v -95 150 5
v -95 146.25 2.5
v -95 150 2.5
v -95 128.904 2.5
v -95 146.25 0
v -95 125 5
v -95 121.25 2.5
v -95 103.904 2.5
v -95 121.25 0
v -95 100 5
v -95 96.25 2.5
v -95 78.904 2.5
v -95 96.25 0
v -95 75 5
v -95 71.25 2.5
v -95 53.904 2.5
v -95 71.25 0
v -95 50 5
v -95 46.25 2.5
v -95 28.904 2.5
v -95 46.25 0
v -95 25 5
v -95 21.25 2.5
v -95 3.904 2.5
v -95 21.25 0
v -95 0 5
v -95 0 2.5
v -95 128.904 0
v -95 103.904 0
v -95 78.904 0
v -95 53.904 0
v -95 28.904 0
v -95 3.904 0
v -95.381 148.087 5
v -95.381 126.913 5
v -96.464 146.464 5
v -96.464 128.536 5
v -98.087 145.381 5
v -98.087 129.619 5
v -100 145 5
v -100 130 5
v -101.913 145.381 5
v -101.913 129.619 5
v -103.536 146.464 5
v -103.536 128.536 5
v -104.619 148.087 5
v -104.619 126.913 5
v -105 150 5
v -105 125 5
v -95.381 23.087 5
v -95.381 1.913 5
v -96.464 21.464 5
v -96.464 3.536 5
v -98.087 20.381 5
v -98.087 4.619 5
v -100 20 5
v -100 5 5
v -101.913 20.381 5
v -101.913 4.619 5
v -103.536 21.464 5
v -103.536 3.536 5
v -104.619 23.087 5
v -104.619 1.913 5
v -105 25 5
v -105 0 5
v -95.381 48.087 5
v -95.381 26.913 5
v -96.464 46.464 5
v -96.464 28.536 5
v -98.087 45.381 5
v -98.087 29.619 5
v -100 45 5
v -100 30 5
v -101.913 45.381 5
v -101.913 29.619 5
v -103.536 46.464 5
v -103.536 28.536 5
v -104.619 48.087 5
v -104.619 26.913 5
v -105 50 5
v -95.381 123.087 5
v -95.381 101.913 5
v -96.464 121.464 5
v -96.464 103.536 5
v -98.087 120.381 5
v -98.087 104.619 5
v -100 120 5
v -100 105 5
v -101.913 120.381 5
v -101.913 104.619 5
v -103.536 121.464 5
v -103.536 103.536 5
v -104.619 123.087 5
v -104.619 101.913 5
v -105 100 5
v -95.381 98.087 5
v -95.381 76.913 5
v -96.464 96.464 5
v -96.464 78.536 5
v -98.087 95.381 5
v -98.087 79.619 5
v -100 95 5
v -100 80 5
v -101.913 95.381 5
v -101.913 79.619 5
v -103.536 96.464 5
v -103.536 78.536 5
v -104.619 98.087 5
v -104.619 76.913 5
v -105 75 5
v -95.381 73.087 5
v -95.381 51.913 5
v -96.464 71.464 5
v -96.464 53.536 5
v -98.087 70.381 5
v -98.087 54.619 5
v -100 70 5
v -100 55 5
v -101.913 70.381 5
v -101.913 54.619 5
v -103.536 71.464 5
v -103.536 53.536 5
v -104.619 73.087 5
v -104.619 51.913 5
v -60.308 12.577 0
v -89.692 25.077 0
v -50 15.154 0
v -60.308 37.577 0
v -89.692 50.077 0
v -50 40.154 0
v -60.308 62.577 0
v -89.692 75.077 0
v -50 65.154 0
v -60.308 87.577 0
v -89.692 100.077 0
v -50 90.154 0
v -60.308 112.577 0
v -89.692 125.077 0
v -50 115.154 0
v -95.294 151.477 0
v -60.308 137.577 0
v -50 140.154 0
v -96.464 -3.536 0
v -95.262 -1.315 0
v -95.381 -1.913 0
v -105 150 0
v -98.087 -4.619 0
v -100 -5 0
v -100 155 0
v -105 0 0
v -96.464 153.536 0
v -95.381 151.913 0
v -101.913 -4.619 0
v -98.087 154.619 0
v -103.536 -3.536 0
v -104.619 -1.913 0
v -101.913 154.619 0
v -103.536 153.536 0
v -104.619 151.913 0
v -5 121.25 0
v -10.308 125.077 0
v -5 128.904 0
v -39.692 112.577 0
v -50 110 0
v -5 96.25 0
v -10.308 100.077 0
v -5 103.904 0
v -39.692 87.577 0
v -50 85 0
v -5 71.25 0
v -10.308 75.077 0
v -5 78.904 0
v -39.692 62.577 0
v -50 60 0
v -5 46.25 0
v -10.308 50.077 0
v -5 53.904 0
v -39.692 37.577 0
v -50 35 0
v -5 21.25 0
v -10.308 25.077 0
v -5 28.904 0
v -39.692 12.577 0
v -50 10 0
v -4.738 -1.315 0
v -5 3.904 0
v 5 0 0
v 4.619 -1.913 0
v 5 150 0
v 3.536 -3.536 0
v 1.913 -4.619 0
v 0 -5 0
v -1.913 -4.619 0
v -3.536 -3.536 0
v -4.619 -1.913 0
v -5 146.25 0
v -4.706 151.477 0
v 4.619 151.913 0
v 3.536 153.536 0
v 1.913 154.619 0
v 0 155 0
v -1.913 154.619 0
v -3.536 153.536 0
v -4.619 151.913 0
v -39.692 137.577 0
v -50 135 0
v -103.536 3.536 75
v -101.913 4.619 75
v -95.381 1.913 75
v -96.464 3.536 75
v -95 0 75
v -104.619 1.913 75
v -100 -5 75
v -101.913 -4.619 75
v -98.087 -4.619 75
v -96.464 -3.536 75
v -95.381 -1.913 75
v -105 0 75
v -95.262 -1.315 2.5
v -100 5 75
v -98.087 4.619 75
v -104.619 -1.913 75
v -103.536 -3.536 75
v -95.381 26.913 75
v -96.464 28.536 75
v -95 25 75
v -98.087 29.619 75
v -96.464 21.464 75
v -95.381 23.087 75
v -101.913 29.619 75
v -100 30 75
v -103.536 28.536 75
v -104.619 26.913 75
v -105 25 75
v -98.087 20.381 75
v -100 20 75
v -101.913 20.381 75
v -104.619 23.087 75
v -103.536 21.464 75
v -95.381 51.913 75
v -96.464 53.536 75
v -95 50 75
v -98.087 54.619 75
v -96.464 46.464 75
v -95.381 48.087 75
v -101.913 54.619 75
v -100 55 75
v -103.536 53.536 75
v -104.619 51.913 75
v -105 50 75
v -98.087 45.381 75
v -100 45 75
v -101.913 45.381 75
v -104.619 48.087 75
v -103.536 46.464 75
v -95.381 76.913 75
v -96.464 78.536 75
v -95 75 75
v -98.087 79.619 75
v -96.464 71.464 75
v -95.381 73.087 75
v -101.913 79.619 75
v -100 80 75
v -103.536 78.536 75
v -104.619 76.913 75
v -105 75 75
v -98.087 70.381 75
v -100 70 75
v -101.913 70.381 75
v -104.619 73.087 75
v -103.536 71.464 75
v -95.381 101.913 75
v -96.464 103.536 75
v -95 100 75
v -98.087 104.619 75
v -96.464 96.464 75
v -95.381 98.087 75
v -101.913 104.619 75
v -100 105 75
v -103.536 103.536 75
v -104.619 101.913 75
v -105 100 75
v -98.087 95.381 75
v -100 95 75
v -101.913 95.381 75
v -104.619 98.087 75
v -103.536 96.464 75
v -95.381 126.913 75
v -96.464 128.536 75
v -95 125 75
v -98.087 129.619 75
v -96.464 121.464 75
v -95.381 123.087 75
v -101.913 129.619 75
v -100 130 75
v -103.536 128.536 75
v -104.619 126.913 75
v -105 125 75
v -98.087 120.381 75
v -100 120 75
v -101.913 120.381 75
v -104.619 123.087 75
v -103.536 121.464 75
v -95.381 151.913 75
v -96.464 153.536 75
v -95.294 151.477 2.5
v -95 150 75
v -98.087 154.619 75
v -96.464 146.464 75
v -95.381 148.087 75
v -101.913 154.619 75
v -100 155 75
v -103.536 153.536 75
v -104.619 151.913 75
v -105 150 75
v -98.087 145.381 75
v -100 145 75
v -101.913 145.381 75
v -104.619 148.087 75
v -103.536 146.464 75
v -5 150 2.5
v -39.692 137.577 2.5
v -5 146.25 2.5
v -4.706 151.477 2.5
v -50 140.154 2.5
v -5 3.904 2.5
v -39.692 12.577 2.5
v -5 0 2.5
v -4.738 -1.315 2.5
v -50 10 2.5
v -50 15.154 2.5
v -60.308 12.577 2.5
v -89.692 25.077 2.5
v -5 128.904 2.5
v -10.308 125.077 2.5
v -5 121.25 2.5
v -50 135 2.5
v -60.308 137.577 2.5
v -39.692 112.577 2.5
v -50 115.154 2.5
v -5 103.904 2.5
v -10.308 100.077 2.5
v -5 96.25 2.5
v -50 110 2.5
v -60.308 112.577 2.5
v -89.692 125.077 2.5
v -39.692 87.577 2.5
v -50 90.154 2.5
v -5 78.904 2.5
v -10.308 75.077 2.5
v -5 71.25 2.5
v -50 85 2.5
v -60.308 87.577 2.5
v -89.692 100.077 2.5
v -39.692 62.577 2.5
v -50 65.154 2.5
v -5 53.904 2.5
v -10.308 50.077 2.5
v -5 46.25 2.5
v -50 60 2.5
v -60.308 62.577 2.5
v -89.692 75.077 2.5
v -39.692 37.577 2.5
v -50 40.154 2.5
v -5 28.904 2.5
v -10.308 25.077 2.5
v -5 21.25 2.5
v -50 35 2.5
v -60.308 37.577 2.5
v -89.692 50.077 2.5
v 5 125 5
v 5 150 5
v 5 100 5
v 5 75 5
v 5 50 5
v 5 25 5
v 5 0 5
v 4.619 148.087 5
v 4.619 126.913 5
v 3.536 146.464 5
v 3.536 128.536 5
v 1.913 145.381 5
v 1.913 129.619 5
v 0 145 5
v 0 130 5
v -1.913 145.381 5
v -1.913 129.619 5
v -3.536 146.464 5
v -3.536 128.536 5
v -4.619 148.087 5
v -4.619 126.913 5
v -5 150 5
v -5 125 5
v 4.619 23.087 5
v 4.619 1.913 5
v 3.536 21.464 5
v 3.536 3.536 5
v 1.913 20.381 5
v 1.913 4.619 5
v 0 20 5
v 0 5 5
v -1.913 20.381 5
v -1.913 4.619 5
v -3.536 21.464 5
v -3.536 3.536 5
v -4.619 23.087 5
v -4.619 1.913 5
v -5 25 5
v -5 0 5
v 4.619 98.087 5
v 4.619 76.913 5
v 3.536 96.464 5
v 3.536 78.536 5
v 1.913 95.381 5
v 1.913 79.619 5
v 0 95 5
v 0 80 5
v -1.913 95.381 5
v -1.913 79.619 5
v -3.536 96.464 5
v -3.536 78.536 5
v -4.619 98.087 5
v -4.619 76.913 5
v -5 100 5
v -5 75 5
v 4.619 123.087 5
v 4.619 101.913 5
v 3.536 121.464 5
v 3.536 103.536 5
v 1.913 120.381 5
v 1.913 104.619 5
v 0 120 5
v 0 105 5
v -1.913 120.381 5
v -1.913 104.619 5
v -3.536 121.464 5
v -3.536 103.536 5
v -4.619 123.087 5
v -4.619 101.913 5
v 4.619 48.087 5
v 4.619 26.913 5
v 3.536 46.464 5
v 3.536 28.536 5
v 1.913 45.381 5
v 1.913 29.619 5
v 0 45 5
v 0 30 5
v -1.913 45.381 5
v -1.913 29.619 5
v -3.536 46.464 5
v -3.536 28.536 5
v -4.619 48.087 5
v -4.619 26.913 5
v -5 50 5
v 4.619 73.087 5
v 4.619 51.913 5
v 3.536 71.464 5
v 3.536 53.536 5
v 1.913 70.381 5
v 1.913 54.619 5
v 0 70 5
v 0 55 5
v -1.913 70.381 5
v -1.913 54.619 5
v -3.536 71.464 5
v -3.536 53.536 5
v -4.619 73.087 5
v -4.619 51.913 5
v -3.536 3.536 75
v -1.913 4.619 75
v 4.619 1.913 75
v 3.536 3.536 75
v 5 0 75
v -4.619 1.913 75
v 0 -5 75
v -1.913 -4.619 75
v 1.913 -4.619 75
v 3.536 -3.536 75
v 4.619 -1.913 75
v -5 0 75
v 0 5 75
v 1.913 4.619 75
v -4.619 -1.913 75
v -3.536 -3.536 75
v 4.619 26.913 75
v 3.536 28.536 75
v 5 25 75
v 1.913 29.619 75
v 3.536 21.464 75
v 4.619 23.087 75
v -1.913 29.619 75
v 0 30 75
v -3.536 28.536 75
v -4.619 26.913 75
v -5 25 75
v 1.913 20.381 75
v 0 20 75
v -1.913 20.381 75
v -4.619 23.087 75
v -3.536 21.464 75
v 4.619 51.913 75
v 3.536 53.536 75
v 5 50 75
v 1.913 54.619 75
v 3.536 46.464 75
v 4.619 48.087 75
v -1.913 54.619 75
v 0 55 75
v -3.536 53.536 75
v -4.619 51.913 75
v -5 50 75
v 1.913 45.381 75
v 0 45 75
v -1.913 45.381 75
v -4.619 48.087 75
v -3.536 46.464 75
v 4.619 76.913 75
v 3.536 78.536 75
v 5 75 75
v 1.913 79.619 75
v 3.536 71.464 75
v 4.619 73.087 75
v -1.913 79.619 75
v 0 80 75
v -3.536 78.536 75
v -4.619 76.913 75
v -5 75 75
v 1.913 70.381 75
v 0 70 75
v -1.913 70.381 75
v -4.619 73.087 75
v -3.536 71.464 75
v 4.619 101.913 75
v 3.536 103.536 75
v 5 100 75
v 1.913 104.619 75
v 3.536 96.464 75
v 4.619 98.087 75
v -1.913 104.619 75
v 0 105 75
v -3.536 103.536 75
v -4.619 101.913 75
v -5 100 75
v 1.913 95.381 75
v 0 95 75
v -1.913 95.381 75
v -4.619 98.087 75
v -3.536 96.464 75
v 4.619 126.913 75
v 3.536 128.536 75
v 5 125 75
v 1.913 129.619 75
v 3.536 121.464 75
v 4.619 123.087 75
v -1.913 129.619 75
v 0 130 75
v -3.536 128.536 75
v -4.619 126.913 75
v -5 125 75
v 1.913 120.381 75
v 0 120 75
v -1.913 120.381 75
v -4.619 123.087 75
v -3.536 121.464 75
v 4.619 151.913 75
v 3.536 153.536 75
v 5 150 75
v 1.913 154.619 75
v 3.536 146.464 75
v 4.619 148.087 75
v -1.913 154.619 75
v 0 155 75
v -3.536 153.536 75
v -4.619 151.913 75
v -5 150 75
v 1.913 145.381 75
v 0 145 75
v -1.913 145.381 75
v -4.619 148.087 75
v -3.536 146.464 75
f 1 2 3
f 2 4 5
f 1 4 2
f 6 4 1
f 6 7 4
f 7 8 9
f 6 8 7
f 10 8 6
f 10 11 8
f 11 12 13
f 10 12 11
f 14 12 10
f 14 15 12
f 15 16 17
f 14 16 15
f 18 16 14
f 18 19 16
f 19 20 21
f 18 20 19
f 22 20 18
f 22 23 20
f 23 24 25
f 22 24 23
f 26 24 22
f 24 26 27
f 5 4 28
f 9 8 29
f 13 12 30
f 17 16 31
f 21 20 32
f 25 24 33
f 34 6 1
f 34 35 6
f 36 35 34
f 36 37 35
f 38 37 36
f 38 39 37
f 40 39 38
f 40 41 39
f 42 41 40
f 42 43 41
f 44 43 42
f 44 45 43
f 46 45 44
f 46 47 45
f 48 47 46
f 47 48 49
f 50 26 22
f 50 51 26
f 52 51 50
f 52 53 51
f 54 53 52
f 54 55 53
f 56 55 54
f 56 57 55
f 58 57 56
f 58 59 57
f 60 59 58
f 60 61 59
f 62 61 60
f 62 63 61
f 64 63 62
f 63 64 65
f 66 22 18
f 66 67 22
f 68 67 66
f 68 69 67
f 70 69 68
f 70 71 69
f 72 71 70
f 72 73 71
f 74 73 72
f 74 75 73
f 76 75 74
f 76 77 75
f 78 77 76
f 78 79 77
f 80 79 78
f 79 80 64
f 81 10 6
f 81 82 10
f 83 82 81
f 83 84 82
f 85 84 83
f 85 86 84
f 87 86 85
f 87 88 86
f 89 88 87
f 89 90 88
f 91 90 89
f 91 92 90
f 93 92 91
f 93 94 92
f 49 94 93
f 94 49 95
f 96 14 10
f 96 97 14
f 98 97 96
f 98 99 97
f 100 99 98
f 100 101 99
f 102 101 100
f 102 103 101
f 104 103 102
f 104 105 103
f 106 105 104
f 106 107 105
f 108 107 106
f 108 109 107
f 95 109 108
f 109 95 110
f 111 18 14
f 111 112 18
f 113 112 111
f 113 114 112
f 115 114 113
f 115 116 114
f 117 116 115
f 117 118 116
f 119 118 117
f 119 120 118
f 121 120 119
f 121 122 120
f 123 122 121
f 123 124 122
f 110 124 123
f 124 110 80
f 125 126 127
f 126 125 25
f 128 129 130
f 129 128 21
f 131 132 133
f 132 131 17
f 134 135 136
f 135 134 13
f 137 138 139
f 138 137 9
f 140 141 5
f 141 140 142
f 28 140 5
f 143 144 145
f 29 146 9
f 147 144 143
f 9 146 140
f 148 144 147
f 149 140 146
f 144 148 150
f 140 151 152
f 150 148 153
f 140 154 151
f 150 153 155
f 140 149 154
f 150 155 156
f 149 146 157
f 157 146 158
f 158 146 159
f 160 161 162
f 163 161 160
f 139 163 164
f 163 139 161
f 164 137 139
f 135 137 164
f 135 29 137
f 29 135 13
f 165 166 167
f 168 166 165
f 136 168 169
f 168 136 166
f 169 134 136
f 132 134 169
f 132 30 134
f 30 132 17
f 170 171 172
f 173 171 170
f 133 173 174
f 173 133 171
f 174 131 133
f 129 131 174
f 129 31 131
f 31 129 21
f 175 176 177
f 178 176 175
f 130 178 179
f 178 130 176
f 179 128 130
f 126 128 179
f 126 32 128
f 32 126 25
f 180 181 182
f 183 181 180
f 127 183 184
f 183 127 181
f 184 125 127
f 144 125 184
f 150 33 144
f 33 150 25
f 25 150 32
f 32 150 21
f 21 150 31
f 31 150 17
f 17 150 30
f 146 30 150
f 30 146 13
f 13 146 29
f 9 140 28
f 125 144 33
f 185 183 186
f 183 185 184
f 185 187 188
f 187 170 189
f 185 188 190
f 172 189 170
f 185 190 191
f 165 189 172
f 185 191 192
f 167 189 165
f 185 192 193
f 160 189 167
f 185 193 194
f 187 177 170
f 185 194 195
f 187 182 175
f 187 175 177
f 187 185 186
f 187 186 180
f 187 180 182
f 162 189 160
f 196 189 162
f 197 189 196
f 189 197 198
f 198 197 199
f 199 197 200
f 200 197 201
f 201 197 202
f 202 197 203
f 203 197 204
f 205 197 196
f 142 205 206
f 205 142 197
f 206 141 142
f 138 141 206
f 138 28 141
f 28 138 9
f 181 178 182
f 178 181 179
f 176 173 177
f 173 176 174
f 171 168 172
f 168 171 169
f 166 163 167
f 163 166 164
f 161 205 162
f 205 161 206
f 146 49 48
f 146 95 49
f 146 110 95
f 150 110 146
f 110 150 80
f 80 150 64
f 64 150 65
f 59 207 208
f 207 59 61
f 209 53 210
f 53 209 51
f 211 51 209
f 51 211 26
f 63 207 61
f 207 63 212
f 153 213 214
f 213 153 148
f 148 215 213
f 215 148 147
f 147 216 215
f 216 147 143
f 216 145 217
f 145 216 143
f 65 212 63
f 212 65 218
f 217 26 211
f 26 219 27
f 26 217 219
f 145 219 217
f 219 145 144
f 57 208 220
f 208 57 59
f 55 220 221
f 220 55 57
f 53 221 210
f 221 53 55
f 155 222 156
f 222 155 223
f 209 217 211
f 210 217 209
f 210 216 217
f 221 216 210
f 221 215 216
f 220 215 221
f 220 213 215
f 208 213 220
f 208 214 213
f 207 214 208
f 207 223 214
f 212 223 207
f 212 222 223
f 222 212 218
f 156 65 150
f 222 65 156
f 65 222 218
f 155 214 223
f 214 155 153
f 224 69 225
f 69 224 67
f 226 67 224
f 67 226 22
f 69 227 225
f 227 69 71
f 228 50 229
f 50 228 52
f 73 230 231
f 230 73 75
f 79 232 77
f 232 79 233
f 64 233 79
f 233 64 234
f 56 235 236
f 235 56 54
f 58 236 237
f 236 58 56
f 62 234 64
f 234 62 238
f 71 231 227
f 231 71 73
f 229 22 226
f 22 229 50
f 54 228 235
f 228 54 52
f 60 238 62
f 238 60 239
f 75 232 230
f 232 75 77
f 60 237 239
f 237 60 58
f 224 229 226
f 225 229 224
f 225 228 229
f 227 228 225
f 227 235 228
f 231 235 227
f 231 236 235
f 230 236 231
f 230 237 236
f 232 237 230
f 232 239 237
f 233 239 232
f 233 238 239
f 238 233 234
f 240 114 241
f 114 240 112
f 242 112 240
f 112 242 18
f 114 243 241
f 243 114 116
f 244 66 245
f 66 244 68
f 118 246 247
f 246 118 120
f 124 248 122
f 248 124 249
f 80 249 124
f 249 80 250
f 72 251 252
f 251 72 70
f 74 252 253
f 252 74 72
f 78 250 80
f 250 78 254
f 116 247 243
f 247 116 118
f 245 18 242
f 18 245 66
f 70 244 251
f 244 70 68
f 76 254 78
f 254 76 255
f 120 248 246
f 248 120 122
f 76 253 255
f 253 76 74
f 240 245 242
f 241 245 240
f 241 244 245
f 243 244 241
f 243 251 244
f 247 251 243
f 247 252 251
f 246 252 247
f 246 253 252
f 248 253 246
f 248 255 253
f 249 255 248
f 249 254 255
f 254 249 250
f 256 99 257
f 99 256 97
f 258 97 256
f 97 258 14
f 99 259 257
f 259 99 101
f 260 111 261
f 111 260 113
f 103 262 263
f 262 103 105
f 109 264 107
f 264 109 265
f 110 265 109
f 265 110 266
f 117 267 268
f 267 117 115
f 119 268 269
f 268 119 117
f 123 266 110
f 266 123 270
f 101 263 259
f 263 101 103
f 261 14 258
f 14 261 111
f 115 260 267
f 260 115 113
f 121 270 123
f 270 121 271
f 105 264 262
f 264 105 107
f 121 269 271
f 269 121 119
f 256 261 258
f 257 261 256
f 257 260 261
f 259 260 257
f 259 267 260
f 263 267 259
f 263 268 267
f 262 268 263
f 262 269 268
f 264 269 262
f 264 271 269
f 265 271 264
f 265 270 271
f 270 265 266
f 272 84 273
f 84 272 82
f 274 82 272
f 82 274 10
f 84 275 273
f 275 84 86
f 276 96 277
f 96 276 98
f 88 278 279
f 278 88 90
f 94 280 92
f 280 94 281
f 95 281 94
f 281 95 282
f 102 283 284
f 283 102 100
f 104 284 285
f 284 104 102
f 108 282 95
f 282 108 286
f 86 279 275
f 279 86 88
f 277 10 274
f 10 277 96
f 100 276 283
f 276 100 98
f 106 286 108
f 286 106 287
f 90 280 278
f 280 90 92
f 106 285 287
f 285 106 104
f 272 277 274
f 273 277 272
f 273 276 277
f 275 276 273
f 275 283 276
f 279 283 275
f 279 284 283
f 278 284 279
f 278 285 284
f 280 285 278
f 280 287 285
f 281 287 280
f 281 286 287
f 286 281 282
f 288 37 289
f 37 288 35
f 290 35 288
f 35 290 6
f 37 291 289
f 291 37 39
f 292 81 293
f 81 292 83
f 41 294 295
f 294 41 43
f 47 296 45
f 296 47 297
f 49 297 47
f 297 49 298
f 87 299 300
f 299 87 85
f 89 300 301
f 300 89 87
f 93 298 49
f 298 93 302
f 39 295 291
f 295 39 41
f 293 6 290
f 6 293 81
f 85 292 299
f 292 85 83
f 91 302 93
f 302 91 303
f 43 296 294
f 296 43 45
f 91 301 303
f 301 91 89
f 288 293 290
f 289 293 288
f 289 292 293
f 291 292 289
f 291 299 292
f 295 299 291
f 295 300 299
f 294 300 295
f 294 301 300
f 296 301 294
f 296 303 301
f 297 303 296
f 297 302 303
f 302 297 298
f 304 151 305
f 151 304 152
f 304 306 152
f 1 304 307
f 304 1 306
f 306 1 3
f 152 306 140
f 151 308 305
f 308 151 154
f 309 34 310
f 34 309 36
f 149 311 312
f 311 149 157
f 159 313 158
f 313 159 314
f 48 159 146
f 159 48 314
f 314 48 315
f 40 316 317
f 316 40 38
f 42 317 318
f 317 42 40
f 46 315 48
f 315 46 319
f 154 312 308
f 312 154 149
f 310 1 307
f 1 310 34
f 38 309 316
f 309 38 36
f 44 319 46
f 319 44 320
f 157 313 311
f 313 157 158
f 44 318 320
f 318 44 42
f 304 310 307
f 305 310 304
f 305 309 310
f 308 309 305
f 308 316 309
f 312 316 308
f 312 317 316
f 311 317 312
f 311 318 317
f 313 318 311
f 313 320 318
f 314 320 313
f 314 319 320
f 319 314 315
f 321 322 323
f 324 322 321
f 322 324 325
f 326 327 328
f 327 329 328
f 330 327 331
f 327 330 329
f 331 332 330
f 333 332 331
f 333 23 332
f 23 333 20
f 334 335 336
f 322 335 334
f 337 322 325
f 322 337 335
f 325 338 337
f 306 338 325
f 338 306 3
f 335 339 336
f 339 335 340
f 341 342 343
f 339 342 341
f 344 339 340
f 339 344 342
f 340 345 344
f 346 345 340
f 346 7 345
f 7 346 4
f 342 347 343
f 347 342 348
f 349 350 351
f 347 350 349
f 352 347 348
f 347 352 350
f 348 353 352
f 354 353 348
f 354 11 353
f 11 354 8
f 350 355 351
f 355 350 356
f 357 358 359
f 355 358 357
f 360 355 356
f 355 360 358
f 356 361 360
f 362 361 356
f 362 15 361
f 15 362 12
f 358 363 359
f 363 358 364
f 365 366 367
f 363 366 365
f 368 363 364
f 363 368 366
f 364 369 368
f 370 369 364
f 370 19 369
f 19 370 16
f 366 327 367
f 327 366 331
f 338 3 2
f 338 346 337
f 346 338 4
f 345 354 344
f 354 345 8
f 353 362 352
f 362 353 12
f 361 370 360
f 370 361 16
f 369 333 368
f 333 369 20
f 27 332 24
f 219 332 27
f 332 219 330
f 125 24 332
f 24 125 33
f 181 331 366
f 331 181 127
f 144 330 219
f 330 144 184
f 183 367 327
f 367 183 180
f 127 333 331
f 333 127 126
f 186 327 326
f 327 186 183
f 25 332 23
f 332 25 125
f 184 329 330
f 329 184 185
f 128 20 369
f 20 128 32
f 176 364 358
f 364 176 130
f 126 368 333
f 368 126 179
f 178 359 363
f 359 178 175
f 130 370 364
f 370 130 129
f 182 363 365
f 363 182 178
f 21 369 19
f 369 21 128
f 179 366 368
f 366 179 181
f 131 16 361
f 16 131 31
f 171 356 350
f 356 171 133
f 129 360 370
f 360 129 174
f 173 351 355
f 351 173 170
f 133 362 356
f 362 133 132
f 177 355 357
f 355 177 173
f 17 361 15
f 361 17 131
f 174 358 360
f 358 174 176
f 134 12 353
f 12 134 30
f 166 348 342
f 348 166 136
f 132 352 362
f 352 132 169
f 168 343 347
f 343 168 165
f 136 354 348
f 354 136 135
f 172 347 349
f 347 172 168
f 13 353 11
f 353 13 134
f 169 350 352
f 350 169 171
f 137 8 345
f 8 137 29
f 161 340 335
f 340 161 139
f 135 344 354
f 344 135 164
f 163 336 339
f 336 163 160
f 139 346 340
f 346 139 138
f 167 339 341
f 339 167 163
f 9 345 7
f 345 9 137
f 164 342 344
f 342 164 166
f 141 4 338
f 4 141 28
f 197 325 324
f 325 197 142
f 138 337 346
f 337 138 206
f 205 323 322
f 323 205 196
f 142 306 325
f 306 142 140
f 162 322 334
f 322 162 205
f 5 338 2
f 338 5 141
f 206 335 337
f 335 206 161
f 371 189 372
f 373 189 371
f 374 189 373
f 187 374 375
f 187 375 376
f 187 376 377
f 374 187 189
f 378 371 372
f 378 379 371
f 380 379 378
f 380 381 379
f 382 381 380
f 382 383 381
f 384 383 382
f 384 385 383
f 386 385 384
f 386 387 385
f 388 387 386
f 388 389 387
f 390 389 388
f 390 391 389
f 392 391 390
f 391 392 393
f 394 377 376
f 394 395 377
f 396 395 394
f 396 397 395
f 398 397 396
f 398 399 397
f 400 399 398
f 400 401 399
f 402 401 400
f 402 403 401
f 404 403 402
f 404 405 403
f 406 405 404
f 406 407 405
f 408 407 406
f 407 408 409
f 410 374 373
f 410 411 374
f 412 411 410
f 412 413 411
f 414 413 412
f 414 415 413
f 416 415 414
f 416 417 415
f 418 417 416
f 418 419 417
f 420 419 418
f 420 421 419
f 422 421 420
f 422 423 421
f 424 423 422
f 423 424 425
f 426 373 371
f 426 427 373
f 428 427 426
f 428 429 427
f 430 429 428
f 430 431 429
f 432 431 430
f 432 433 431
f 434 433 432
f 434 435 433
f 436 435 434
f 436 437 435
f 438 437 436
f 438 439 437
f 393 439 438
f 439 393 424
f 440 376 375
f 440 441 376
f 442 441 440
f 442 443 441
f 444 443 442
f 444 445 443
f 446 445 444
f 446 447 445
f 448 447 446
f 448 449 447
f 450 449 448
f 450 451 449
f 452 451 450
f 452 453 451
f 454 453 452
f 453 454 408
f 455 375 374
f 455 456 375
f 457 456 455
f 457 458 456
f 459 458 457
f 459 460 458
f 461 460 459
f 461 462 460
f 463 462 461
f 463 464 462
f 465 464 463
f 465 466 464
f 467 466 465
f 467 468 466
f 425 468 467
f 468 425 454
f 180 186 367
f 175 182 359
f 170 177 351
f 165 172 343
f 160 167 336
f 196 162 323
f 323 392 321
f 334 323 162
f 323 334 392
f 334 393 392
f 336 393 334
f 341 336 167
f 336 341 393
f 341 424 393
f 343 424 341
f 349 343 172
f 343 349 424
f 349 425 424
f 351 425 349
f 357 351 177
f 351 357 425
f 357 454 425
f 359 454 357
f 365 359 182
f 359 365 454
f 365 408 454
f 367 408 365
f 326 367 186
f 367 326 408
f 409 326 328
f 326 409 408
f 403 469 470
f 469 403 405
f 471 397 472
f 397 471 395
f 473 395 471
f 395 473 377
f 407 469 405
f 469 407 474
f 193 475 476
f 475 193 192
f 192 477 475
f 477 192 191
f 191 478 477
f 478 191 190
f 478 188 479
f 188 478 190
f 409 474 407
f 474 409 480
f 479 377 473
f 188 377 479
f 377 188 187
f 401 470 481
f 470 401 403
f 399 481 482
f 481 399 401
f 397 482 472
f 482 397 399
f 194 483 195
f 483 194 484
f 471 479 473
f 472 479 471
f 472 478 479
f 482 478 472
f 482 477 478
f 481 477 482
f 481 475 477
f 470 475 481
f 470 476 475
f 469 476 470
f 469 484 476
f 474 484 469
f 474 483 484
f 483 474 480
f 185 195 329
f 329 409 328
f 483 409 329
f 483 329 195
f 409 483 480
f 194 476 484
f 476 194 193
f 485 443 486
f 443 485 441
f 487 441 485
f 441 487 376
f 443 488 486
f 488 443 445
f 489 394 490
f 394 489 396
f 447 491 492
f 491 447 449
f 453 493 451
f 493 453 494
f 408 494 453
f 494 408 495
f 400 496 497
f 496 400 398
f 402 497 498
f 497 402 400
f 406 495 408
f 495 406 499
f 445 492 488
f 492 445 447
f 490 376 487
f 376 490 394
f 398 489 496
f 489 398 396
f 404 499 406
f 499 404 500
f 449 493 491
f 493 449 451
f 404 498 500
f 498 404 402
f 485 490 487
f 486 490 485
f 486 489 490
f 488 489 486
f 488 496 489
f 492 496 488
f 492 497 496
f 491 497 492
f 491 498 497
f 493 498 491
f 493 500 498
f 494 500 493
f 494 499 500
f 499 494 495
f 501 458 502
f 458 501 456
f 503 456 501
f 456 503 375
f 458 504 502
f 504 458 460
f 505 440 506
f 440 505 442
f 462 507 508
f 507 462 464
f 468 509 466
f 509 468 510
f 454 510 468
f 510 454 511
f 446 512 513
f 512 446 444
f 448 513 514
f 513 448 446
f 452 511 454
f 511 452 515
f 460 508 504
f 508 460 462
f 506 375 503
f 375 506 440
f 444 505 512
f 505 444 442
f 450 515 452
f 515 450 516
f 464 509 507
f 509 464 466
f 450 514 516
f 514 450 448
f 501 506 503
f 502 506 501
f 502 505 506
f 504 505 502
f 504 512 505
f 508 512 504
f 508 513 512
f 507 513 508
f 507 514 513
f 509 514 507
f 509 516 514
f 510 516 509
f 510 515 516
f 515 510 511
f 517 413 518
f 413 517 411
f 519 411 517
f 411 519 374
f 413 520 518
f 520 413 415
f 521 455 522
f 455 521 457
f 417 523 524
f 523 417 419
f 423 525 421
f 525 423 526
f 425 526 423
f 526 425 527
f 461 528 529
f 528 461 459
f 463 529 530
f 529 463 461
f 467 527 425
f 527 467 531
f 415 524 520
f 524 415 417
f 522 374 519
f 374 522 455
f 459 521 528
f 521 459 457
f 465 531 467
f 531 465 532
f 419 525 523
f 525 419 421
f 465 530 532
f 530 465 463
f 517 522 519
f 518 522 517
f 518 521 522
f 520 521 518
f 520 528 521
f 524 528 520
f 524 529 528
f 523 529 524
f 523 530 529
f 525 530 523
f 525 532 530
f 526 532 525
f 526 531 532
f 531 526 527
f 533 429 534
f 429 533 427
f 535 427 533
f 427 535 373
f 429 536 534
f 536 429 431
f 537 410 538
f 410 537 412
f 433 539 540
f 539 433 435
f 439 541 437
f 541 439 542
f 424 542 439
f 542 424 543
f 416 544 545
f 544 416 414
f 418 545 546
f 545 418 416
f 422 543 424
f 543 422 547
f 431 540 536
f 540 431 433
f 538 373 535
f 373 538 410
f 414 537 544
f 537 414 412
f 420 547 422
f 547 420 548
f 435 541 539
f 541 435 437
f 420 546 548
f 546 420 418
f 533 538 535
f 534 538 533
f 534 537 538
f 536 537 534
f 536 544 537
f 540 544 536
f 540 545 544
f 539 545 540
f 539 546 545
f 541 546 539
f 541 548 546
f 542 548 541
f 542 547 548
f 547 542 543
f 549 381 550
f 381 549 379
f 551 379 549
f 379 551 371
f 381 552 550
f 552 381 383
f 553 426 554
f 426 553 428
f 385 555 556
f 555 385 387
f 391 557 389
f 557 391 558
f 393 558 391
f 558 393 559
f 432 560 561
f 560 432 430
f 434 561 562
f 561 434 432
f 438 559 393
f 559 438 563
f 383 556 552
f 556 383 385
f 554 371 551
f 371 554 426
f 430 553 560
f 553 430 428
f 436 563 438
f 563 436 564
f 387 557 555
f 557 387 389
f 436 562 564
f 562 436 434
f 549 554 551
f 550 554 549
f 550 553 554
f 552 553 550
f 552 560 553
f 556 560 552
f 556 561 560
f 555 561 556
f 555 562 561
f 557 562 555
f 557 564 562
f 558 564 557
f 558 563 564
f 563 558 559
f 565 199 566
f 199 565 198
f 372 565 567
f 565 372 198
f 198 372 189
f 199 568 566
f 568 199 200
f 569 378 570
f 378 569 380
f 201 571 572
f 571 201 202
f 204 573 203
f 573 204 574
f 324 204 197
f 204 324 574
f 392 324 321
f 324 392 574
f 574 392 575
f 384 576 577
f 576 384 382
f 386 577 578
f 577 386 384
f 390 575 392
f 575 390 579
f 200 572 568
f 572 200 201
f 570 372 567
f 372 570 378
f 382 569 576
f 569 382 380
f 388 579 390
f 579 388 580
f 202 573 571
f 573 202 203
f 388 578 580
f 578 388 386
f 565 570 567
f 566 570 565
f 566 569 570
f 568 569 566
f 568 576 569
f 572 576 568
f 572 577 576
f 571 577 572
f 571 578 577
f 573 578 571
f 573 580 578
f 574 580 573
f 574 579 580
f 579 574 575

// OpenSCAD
union() {
	translate(v = [-5, 0, 0]) {
		cube(size = [10, 150, 5]);
	}
	translate(v = [0, 0, 0]) {
		cylinder(h = 75, r = 5);
	}
	translate(v = [0, 25, 0]) {
		cylinder(h = 75, r = 5);
	}
	translate(v = [0, 50, 0]) {
		cylinder(h = 75, r = 5);
	}
	translate(v = [0, 75, 0]) {
		cylinder(h = 75, r = 5);
	}
	translate(v = [0, 100, 0]) {
		cylinder(h = 75, r = 5);
	}
	translate(v = [0, 125, 0]) {
		cylinder(h = 75, r = 5);
	}
	translate(v = [0, 150, 0]) {
		cylinder(h = 75, r = 5);
	}
	translate(v = [-100, 0, 0]) {
		union() {
			translate(v = [-5, 0, 0]) {
				cube(size = [10, 150, 5]);
			}
			translate(v = [0, 0, 0]) {
				cylinder(h = 75, r = 5);
			}
			translate(v = [0, 25, 0]) {
				cylinder(h = 75, r = 5);
			}
			translate(v = [0, 50, 0]) {
				cylinder(h = 75, r = 5);
			}
			translate(v = [0, 75, 0]) {
				cylinder(h = 75, r = 5);
			}
			translate(v = [0, 100, 0]) {
				cylinder(h = 75, r = 5);
			}
			translate(v = [0, 125, 0]) {
				cylinder(h = 75, r = 5);
			}
			translate(v = [0, 150, 0]) {
				cylinder(h = 75, r = 5);
			}
		}
	}
	translate(v = [0, -2.5, 0]) {
		union() {
			translate(v = [0, 25, 0]) {
				rotate(a = [0, 0, 14.036243467926479]) {
					translate(v = [-100, 0, 0]) {
						cube(size = [103.07764064044152, 5, 2.5]);
					}
				}
			}
			rotate(a = [0, 0, -14.036243467926479]) {
				translate(v = [-100, 0, 0]) {
					cube(size = [103.07764064044152, 5, 2.5]);
				}
			}
		}
	}
	translate(v = [0, 22.5, 0]) {
		union() {
			translate(v = [0, 25, 0]) {
				rotate(a = [0, 0, 14.036243467926479]) {
					translate(v = [-100, 0, 0]) {
						cube(size = [103.07764064044152, 5, 2.5]);
					}
				}
			}
			rotate(a = [0, 0, -14.036243467926479]) {
				translate(v = [-100, 0, 0]) {
					cube(size = [103.07764064044152, 5, 2.5]);
				}
			}
		}
	}
	translate(v = [0, 47.5, 0]) {
		union() {
			translate(v = [0, 25, 0]) {
				rotate(a = [0, 0, 14.036243467926479]) {
					translate(v = [-100, 0, 0]) {
						cube(size = [103.07764064044152, 5, 2.5]);
					}
				}
			}
			rotate(a = [0, 0, -14.036243467926479]) {
				translate(v = [-100, 0, 0]) {
					cube(size = [103.07764064044152, 5, 2.5]);
				}
			}
		}
	}
	translate(v = [0, 72.5, 0]) {
		union() {
			translate(v = [0, 25, 0]) {
				rotate(a = [0, 0, 14.036243467926479]) {
					translate(v = [-100, 0, 0]) {
						cube(size = [103.07764064044152, 5, 2.5]);
					}
				}
			}
			rotate(a = [0, 0, -14.036243467926479]) {
				translate(v = [-100, 0, 0]) {
					cube(size = [103.07764064044152, 5, 2.5]);
				}
			}
		}
	}
	translate(v = [0, 97.5, 0]) {
		union() {
			translate(v = [0, 25, 0]) {
				rotate(a = [0, 0, 14.036243467926479]) {
					translate(v = [-100, 0, 0]) {
						cube(size = [103.07764064044152, 5, 2.5]);
					}
				}
			}
			rotate(a = [0, 0, -14.036243467926479]) {
				translate(v = [-100, 0, 0]) {
					cube(size = [103.07764064044152, 5, 2.5]);
				}
			}
		}
	}
	translate(v = [0, 122.5, 0]) {
		union() {
			translate(v = [0, 25, 0]) {
				rotate(a = [0, 0, 14.036243467926479]) {
					translate(v = [-100, 0, 0]) {
						cube(size = [103.07764064044152, 5, 2.5]);
					}
				}
			}
			rotate(a = [0, 0, -14.036243467926479]) {
				translate(v = [-100, 0, 0]) {
					cube(size = [103.07764064044152, 5, 2.5]);
				}
			}
		}
	}
}
